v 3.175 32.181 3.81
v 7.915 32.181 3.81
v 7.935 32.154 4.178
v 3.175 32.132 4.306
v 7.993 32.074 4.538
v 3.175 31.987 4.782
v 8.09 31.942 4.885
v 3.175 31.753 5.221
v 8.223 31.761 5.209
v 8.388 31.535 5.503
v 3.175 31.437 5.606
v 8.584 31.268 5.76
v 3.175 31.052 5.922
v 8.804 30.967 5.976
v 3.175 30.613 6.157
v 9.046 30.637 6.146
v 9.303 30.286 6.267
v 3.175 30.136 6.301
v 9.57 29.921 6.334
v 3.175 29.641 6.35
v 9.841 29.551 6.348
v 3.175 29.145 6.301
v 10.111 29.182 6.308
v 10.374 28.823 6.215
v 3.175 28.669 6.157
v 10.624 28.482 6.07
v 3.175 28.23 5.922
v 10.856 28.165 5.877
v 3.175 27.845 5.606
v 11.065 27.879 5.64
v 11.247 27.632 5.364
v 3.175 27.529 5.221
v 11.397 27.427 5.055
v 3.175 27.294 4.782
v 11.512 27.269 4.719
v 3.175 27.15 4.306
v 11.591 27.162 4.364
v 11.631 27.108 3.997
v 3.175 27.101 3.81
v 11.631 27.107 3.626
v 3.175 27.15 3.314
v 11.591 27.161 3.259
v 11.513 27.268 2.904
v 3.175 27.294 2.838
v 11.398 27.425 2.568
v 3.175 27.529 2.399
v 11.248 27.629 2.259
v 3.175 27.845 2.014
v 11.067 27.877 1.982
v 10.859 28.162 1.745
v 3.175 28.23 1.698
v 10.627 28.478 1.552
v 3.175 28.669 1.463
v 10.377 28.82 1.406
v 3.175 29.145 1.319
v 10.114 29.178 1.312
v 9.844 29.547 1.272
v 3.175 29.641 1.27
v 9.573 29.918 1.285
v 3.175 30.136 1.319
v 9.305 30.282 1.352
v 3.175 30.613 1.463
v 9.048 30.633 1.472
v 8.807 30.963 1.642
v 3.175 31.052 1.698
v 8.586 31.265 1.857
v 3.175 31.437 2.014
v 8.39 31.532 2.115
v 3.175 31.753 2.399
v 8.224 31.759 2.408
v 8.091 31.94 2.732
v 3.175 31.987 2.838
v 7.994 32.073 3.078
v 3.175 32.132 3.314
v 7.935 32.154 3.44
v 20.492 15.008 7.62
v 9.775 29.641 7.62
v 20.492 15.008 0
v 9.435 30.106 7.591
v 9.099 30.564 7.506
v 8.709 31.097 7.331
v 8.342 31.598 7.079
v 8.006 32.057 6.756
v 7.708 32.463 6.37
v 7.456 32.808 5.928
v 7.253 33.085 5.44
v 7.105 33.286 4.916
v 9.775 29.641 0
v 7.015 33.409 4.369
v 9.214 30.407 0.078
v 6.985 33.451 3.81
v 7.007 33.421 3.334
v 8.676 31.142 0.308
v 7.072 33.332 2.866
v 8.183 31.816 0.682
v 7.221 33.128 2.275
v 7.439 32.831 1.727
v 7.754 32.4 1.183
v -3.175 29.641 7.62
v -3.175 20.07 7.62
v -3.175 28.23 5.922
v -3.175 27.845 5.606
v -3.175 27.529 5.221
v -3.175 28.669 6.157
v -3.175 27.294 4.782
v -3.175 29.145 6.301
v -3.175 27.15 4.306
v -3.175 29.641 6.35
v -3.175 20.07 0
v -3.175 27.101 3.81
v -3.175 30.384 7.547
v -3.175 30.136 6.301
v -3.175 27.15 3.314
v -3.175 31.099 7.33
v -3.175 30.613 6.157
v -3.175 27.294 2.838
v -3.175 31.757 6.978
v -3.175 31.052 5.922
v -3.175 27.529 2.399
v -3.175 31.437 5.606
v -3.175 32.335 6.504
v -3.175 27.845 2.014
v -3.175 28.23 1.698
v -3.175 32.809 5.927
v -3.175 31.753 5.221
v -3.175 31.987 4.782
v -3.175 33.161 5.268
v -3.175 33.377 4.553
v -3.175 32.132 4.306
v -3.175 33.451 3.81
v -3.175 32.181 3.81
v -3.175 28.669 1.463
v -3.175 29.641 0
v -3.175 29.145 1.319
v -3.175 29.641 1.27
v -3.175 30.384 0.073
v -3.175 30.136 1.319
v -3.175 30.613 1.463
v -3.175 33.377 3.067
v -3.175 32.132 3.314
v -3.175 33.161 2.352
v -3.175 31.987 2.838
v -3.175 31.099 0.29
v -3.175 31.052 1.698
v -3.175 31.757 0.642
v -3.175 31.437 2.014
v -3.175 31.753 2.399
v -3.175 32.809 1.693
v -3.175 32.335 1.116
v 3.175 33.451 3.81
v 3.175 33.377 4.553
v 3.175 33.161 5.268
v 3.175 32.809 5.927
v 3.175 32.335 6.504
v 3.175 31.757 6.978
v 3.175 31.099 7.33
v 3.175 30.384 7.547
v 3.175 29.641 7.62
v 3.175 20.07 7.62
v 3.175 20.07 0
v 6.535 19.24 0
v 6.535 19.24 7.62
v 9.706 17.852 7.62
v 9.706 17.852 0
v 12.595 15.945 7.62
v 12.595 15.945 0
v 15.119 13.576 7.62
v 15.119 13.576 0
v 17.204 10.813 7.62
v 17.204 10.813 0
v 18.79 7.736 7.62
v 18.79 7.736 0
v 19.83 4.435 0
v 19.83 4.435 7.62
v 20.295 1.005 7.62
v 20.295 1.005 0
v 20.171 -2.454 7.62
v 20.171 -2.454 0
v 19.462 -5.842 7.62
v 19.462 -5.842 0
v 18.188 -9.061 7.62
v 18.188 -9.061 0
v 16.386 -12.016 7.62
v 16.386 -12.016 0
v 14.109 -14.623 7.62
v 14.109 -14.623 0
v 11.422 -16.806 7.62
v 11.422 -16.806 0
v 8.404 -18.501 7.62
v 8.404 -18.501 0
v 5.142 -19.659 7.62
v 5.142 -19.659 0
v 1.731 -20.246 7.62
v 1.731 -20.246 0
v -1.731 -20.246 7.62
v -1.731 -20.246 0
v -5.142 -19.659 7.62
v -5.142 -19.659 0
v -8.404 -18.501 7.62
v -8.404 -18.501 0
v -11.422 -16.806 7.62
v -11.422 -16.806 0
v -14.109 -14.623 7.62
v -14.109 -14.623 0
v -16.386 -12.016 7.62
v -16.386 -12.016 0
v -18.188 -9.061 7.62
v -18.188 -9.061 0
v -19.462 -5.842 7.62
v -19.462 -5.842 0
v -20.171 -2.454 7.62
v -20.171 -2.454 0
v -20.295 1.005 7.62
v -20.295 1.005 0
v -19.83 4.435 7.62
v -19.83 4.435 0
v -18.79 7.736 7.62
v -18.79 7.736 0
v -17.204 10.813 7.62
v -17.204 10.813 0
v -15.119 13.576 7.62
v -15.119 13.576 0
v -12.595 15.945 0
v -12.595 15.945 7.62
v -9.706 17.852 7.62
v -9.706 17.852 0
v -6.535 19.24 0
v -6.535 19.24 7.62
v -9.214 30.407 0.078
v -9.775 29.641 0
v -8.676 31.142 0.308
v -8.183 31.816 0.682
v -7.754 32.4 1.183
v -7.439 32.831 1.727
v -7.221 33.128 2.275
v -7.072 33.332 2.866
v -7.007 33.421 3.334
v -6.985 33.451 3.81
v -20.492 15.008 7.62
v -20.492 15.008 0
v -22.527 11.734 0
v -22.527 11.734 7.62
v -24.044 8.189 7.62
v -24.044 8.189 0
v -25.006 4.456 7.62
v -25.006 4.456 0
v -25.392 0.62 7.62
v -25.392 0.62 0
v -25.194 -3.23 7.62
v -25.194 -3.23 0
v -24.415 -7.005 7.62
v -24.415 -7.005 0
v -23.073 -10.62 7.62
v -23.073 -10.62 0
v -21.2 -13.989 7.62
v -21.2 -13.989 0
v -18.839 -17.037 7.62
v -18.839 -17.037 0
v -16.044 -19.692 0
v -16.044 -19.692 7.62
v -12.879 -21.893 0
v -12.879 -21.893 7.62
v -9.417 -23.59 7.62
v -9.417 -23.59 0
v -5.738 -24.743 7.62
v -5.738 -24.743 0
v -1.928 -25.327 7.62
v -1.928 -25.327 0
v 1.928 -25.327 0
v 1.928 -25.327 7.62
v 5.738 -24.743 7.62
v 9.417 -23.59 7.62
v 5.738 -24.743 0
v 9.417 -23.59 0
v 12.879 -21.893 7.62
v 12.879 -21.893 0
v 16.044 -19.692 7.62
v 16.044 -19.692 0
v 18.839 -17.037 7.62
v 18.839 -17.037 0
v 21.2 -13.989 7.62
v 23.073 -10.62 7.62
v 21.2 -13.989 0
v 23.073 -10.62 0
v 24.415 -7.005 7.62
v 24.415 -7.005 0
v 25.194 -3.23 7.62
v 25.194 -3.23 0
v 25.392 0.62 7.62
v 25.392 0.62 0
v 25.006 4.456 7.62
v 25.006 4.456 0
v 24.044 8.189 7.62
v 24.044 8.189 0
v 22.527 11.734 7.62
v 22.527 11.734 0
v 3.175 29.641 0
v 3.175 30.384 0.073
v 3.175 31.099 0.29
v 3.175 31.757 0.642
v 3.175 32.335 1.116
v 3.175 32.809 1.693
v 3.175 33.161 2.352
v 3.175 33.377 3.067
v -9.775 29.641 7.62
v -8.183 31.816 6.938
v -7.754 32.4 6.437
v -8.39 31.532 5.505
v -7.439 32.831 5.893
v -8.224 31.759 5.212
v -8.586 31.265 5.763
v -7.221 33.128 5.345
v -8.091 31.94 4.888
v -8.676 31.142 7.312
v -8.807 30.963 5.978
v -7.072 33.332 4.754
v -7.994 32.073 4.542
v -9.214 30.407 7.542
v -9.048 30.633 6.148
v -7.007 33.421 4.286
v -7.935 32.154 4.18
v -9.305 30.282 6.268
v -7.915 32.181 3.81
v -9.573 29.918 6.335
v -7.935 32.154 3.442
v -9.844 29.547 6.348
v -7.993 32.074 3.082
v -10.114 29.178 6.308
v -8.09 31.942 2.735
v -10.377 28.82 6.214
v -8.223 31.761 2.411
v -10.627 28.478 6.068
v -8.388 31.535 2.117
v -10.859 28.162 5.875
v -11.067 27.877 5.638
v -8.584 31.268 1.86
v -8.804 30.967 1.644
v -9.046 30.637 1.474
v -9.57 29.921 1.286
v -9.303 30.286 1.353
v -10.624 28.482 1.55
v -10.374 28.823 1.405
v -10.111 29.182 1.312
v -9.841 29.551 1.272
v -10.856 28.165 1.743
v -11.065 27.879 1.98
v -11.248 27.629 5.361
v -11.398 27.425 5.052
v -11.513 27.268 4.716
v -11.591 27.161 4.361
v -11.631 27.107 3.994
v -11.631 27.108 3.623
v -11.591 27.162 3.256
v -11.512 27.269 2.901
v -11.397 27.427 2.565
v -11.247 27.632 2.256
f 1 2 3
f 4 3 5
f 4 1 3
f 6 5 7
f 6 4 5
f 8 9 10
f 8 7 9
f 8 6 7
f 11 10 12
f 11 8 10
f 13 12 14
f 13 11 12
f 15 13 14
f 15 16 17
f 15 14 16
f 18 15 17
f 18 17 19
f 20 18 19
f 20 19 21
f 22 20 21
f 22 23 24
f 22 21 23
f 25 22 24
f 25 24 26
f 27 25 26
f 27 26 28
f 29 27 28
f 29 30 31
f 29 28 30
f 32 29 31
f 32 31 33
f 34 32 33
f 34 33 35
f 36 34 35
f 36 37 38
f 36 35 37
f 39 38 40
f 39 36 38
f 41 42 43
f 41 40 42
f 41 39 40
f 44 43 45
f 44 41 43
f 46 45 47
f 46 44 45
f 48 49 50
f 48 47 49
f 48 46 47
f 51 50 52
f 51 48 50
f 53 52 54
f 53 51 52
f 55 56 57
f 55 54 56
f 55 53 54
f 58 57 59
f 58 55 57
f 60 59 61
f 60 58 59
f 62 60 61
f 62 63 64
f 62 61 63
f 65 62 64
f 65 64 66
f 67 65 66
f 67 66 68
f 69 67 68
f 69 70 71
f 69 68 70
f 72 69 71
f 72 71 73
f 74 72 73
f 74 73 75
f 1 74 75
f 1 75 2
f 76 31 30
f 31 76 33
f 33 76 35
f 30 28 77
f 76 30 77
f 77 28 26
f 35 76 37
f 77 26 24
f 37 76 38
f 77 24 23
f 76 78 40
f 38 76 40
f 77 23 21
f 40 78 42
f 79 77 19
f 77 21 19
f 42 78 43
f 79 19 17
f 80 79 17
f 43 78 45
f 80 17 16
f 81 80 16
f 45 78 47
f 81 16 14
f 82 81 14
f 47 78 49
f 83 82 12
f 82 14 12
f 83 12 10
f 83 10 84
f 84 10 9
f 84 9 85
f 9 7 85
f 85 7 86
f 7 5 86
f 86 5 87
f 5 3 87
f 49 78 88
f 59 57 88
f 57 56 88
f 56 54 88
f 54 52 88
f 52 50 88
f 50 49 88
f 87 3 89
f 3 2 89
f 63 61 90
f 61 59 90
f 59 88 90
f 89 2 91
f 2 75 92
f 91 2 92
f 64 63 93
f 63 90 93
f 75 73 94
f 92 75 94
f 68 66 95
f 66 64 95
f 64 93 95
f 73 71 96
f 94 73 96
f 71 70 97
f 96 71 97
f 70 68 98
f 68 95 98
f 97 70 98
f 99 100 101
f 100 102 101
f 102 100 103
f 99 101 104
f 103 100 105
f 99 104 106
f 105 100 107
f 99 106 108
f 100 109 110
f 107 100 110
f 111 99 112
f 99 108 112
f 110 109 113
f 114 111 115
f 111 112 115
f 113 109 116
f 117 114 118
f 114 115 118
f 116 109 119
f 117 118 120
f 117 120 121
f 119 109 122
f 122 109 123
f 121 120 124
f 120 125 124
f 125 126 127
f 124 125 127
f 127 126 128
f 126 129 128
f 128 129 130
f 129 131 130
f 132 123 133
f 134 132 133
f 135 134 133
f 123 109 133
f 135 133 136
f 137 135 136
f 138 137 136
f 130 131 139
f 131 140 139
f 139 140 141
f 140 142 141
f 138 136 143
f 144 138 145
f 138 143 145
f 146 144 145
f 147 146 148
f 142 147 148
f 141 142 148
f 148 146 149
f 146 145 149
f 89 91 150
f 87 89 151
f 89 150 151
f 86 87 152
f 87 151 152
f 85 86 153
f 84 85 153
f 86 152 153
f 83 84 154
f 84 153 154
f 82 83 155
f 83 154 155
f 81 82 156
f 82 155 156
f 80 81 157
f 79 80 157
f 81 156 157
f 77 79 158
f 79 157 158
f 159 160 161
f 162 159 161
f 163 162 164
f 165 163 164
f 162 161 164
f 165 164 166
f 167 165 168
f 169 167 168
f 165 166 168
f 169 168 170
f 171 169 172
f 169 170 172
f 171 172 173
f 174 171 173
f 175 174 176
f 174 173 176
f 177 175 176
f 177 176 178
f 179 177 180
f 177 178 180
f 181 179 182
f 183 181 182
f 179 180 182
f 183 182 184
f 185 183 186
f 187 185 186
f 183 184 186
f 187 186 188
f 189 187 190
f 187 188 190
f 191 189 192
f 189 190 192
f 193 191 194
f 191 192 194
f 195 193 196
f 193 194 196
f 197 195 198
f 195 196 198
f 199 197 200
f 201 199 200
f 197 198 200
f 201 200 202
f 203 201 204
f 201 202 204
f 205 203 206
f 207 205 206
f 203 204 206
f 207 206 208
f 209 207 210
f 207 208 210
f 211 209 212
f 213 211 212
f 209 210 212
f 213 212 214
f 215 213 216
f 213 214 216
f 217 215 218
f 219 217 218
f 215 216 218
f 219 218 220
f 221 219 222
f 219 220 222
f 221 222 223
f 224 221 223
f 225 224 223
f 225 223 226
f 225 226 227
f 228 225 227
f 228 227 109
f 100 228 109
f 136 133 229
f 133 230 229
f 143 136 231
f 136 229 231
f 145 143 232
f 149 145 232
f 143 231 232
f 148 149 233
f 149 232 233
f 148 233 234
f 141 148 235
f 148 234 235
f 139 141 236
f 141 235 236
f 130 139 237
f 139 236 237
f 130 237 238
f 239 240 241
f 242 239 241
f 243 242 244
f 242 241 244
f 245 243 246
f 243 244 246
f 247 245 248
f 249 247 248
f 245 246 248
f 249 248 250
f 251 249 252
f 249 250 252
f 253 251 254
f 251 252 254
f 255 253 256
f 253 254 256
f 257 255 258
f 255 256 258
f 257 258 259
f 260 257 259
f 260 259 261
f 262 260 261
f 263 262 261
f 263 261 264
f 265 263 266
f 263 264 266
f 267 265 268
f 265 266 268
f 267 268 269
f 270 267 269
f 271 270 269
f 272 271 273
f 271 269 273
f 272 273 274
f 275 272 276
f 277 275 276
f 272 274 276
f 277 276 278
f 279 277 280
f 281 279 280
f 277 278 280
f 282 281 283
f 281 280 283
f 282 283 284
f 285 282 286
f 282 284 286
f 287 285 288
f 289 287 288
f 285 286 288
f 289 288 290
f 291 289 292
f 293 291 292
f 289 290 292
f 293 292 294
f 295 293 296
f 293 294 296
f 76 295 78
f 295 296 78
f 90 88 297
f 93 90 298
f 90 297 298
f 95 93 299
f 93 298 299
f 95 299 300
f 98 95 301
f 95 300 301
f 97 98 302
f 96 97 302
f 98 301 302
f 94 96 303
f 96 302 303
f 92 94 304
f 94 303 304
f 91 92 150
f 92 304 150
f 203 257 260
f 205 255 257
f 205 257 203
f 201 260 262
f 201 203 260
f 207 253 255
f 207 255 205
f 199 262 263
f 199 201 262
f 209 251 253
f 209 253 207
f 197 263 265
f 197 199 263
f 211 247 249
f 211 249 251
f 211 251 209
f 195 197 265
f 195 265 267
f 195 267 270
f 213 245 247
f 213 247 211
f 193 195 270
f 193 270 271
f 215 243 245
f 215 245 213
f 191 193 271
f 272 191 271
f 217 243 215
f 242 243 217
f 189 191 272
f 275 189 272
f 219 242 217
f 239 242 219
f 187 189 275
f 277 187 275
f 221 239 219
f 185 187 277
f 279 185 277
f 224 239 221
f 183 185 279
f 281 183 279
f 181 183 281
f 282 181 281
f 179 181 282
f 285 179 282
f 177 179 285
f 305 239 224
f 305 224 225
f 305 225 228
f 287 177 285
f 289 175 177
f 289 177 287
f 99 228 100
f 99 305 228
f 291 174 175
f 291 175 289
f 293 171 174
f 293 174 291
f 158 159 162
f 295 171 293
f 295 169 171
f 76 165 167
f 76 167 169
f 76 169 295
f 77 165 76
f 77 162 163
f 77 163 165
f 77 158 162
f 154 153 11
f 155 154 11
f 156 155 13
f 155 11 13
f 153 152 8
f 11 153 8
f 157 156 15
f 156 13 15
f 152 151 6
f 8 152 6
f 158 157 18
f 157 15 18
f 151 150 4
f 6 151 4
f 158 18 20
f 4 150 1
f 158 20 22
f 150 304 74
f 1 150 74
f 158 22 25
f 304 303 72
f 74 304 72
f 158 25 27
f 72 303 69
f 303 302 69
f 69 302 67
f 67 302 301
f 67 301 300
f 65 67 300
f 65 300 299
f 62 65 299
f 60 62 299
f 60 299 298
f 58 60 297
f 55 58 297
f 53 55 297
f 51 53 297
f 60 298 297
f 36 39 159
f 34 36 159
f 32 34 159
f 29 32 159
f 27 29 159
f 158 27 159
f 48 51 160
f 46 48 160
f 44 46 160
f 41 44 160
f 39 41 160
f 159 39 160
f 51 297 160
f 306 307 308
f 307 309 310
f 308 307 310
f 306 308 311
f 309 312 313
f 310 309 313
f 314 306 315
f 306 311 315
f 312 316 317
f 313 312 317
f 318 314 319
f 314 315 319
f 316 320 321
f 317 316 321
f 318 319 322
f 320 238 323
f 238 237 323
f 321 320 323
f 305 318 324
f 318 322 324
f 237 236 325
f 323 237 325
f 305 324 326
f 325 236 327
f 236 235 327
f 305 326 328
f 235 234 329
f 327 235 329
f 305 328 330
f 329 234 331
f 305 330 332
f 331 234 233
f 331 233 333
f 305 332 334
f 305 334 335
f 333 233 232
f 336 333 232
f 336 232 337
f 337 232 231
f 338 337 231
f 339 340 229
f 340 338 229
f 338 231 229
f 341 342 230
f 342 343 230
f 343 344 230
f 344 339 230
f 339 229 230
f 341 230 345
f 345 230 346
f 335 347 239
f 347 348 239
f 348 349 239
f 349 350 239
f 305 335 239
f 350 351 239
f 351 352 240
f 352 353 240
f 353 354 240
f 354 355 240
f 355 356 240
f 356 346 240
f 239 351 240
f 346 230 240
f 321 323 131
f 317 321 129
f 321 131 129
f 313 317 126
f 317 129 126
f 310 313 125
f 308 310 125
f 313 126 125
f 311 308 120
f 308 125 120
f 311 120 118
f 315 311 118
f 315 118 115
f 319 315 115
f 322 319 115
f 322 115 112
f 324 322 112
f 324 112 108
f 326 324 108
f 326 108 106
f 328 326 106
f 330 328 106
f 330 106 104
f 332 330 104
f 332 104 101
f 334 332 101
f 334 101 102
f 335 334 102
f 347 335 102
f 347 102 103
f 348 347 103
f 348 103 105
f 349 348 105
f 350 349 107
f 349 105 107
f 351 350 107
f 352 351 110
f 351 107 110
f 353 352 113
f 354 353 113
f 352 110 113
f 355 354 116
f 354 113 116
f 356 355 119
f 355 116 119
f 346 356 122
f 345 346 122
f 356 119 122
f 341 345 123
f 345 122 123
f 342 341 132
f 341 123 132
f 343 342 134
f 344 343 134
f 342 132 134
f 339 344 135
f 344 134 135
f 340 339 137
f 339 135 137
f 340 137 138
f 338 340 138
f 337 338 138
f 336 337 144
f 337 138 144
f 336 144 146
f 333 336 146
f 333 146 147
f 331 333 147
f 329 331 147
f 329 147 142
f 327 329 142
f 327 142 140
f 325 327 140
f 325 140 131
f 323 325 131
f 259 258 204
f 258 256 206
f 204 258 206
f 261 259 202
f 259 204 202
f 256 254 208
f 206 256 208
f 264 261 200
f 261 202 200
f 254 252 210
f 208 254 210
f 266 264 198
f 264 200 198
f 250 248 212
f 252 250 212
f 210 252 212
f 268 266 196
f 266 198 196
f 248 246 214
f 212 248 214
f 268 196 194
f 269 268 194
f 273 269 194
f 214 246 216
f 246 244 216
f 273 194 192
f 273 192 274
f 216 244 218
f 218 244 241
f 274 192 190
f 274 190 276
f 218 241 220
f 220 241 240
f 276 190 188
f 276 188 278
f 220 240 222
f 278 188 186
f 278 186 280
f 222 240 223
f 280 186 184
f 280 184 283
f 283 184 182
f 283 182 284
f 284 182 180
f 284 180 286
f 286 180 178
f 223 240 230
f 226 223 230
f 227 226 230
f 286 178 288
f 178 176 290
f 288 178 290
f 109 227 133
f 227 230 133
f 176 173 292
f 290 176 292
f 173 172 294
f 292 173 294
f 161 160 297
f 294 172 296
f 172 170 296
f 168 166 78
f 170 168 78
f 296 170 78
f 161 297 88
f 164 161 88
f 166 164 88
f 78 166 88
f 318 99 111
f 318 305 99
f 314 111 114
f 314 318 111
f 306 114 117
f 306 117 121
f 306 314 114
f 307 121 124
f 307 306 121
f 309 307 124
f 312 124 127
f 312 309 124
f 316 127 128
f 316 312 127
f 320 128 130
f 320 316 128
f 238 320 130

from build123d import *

# Parameters (mm, degrees)
F1_DEPTH      = 7.62
F2_R          = 2.54
F3_DEPTH      = 25.4
F3_DEPTH_BACK = 25.4
F4_R          = 3.81
F5_R          = 3.80999


# Not quite as in the source:
# - a fillet or chamfer is up to 0.001 mm smaller than in the source, because OpenCascade refuses the exact size


with BuildPart() as f1:
    # F0 (on Top) → F1 (new body)
    with BuildSketch(Plane.XY):
        with BuildLine():
            ThreePointArc((3.175, 20.0704203992), (0, -20.32), (-3.175, 20.0704203992))
            Line((-3.175, 20.0704203992), (-3.175, 33.4507006653))
            Line((-3.175, 33.4507006653), (-6.985, 33.4507006653))
            Line((-6.985, 33.4507006653), (-20.4920611043, 15.0078456714))
            ThreePointArc((-20.4920611043, 15.0078456714), (0, -25.4), (20.4920611043, 15.0078456714))
            Line((20.4920611043, 15.0078456714), (6.985, 33.4507006653))
            Line((6.985, 33.4507006653), (3.175, 33.4507006653))
            Line((3.175, 33.4507006653), (3.175, 20.0704203992))
        make_face()
    extrude(amount=F1_DEPTH)

    # F2 (on face) → F3 (cut, two sides)
    with BuildSketch(Plane.YZ.offset(-3.175)) as f3_sk:
        with Locations((29.6407006653, 3.81)):
            Circle(F2_R)
    extrude(amount=F3_DEPTH, mode=Mode.SUBTRACT)
    extrude(f3_sk.sketch, amount=-F3_DEPTH_BACK, mode=Mode.SUBTRACT)

    # F4
    f4_edges = [f1.edges().sort_by_distance(p)[0] for p in [
        (-5.08, 33.450701, 0),
        (5.08, 33.450701, 0),
    ]]
    fillet(f4_edges, radius=F4_R)

    # F5 (radius 3.81 in the source; OpenCascade refuses exactly that, so slightly less here)
    f5_edges = [f1.edges().sort_by_distance(p)[0] for p in [
        (-5.08, 33.450701, 7.62),
        (5.08, 33.450701, 7.62),
    ]]
    fillet(f5_edges, radius=F5_R)


solid = f1.part
